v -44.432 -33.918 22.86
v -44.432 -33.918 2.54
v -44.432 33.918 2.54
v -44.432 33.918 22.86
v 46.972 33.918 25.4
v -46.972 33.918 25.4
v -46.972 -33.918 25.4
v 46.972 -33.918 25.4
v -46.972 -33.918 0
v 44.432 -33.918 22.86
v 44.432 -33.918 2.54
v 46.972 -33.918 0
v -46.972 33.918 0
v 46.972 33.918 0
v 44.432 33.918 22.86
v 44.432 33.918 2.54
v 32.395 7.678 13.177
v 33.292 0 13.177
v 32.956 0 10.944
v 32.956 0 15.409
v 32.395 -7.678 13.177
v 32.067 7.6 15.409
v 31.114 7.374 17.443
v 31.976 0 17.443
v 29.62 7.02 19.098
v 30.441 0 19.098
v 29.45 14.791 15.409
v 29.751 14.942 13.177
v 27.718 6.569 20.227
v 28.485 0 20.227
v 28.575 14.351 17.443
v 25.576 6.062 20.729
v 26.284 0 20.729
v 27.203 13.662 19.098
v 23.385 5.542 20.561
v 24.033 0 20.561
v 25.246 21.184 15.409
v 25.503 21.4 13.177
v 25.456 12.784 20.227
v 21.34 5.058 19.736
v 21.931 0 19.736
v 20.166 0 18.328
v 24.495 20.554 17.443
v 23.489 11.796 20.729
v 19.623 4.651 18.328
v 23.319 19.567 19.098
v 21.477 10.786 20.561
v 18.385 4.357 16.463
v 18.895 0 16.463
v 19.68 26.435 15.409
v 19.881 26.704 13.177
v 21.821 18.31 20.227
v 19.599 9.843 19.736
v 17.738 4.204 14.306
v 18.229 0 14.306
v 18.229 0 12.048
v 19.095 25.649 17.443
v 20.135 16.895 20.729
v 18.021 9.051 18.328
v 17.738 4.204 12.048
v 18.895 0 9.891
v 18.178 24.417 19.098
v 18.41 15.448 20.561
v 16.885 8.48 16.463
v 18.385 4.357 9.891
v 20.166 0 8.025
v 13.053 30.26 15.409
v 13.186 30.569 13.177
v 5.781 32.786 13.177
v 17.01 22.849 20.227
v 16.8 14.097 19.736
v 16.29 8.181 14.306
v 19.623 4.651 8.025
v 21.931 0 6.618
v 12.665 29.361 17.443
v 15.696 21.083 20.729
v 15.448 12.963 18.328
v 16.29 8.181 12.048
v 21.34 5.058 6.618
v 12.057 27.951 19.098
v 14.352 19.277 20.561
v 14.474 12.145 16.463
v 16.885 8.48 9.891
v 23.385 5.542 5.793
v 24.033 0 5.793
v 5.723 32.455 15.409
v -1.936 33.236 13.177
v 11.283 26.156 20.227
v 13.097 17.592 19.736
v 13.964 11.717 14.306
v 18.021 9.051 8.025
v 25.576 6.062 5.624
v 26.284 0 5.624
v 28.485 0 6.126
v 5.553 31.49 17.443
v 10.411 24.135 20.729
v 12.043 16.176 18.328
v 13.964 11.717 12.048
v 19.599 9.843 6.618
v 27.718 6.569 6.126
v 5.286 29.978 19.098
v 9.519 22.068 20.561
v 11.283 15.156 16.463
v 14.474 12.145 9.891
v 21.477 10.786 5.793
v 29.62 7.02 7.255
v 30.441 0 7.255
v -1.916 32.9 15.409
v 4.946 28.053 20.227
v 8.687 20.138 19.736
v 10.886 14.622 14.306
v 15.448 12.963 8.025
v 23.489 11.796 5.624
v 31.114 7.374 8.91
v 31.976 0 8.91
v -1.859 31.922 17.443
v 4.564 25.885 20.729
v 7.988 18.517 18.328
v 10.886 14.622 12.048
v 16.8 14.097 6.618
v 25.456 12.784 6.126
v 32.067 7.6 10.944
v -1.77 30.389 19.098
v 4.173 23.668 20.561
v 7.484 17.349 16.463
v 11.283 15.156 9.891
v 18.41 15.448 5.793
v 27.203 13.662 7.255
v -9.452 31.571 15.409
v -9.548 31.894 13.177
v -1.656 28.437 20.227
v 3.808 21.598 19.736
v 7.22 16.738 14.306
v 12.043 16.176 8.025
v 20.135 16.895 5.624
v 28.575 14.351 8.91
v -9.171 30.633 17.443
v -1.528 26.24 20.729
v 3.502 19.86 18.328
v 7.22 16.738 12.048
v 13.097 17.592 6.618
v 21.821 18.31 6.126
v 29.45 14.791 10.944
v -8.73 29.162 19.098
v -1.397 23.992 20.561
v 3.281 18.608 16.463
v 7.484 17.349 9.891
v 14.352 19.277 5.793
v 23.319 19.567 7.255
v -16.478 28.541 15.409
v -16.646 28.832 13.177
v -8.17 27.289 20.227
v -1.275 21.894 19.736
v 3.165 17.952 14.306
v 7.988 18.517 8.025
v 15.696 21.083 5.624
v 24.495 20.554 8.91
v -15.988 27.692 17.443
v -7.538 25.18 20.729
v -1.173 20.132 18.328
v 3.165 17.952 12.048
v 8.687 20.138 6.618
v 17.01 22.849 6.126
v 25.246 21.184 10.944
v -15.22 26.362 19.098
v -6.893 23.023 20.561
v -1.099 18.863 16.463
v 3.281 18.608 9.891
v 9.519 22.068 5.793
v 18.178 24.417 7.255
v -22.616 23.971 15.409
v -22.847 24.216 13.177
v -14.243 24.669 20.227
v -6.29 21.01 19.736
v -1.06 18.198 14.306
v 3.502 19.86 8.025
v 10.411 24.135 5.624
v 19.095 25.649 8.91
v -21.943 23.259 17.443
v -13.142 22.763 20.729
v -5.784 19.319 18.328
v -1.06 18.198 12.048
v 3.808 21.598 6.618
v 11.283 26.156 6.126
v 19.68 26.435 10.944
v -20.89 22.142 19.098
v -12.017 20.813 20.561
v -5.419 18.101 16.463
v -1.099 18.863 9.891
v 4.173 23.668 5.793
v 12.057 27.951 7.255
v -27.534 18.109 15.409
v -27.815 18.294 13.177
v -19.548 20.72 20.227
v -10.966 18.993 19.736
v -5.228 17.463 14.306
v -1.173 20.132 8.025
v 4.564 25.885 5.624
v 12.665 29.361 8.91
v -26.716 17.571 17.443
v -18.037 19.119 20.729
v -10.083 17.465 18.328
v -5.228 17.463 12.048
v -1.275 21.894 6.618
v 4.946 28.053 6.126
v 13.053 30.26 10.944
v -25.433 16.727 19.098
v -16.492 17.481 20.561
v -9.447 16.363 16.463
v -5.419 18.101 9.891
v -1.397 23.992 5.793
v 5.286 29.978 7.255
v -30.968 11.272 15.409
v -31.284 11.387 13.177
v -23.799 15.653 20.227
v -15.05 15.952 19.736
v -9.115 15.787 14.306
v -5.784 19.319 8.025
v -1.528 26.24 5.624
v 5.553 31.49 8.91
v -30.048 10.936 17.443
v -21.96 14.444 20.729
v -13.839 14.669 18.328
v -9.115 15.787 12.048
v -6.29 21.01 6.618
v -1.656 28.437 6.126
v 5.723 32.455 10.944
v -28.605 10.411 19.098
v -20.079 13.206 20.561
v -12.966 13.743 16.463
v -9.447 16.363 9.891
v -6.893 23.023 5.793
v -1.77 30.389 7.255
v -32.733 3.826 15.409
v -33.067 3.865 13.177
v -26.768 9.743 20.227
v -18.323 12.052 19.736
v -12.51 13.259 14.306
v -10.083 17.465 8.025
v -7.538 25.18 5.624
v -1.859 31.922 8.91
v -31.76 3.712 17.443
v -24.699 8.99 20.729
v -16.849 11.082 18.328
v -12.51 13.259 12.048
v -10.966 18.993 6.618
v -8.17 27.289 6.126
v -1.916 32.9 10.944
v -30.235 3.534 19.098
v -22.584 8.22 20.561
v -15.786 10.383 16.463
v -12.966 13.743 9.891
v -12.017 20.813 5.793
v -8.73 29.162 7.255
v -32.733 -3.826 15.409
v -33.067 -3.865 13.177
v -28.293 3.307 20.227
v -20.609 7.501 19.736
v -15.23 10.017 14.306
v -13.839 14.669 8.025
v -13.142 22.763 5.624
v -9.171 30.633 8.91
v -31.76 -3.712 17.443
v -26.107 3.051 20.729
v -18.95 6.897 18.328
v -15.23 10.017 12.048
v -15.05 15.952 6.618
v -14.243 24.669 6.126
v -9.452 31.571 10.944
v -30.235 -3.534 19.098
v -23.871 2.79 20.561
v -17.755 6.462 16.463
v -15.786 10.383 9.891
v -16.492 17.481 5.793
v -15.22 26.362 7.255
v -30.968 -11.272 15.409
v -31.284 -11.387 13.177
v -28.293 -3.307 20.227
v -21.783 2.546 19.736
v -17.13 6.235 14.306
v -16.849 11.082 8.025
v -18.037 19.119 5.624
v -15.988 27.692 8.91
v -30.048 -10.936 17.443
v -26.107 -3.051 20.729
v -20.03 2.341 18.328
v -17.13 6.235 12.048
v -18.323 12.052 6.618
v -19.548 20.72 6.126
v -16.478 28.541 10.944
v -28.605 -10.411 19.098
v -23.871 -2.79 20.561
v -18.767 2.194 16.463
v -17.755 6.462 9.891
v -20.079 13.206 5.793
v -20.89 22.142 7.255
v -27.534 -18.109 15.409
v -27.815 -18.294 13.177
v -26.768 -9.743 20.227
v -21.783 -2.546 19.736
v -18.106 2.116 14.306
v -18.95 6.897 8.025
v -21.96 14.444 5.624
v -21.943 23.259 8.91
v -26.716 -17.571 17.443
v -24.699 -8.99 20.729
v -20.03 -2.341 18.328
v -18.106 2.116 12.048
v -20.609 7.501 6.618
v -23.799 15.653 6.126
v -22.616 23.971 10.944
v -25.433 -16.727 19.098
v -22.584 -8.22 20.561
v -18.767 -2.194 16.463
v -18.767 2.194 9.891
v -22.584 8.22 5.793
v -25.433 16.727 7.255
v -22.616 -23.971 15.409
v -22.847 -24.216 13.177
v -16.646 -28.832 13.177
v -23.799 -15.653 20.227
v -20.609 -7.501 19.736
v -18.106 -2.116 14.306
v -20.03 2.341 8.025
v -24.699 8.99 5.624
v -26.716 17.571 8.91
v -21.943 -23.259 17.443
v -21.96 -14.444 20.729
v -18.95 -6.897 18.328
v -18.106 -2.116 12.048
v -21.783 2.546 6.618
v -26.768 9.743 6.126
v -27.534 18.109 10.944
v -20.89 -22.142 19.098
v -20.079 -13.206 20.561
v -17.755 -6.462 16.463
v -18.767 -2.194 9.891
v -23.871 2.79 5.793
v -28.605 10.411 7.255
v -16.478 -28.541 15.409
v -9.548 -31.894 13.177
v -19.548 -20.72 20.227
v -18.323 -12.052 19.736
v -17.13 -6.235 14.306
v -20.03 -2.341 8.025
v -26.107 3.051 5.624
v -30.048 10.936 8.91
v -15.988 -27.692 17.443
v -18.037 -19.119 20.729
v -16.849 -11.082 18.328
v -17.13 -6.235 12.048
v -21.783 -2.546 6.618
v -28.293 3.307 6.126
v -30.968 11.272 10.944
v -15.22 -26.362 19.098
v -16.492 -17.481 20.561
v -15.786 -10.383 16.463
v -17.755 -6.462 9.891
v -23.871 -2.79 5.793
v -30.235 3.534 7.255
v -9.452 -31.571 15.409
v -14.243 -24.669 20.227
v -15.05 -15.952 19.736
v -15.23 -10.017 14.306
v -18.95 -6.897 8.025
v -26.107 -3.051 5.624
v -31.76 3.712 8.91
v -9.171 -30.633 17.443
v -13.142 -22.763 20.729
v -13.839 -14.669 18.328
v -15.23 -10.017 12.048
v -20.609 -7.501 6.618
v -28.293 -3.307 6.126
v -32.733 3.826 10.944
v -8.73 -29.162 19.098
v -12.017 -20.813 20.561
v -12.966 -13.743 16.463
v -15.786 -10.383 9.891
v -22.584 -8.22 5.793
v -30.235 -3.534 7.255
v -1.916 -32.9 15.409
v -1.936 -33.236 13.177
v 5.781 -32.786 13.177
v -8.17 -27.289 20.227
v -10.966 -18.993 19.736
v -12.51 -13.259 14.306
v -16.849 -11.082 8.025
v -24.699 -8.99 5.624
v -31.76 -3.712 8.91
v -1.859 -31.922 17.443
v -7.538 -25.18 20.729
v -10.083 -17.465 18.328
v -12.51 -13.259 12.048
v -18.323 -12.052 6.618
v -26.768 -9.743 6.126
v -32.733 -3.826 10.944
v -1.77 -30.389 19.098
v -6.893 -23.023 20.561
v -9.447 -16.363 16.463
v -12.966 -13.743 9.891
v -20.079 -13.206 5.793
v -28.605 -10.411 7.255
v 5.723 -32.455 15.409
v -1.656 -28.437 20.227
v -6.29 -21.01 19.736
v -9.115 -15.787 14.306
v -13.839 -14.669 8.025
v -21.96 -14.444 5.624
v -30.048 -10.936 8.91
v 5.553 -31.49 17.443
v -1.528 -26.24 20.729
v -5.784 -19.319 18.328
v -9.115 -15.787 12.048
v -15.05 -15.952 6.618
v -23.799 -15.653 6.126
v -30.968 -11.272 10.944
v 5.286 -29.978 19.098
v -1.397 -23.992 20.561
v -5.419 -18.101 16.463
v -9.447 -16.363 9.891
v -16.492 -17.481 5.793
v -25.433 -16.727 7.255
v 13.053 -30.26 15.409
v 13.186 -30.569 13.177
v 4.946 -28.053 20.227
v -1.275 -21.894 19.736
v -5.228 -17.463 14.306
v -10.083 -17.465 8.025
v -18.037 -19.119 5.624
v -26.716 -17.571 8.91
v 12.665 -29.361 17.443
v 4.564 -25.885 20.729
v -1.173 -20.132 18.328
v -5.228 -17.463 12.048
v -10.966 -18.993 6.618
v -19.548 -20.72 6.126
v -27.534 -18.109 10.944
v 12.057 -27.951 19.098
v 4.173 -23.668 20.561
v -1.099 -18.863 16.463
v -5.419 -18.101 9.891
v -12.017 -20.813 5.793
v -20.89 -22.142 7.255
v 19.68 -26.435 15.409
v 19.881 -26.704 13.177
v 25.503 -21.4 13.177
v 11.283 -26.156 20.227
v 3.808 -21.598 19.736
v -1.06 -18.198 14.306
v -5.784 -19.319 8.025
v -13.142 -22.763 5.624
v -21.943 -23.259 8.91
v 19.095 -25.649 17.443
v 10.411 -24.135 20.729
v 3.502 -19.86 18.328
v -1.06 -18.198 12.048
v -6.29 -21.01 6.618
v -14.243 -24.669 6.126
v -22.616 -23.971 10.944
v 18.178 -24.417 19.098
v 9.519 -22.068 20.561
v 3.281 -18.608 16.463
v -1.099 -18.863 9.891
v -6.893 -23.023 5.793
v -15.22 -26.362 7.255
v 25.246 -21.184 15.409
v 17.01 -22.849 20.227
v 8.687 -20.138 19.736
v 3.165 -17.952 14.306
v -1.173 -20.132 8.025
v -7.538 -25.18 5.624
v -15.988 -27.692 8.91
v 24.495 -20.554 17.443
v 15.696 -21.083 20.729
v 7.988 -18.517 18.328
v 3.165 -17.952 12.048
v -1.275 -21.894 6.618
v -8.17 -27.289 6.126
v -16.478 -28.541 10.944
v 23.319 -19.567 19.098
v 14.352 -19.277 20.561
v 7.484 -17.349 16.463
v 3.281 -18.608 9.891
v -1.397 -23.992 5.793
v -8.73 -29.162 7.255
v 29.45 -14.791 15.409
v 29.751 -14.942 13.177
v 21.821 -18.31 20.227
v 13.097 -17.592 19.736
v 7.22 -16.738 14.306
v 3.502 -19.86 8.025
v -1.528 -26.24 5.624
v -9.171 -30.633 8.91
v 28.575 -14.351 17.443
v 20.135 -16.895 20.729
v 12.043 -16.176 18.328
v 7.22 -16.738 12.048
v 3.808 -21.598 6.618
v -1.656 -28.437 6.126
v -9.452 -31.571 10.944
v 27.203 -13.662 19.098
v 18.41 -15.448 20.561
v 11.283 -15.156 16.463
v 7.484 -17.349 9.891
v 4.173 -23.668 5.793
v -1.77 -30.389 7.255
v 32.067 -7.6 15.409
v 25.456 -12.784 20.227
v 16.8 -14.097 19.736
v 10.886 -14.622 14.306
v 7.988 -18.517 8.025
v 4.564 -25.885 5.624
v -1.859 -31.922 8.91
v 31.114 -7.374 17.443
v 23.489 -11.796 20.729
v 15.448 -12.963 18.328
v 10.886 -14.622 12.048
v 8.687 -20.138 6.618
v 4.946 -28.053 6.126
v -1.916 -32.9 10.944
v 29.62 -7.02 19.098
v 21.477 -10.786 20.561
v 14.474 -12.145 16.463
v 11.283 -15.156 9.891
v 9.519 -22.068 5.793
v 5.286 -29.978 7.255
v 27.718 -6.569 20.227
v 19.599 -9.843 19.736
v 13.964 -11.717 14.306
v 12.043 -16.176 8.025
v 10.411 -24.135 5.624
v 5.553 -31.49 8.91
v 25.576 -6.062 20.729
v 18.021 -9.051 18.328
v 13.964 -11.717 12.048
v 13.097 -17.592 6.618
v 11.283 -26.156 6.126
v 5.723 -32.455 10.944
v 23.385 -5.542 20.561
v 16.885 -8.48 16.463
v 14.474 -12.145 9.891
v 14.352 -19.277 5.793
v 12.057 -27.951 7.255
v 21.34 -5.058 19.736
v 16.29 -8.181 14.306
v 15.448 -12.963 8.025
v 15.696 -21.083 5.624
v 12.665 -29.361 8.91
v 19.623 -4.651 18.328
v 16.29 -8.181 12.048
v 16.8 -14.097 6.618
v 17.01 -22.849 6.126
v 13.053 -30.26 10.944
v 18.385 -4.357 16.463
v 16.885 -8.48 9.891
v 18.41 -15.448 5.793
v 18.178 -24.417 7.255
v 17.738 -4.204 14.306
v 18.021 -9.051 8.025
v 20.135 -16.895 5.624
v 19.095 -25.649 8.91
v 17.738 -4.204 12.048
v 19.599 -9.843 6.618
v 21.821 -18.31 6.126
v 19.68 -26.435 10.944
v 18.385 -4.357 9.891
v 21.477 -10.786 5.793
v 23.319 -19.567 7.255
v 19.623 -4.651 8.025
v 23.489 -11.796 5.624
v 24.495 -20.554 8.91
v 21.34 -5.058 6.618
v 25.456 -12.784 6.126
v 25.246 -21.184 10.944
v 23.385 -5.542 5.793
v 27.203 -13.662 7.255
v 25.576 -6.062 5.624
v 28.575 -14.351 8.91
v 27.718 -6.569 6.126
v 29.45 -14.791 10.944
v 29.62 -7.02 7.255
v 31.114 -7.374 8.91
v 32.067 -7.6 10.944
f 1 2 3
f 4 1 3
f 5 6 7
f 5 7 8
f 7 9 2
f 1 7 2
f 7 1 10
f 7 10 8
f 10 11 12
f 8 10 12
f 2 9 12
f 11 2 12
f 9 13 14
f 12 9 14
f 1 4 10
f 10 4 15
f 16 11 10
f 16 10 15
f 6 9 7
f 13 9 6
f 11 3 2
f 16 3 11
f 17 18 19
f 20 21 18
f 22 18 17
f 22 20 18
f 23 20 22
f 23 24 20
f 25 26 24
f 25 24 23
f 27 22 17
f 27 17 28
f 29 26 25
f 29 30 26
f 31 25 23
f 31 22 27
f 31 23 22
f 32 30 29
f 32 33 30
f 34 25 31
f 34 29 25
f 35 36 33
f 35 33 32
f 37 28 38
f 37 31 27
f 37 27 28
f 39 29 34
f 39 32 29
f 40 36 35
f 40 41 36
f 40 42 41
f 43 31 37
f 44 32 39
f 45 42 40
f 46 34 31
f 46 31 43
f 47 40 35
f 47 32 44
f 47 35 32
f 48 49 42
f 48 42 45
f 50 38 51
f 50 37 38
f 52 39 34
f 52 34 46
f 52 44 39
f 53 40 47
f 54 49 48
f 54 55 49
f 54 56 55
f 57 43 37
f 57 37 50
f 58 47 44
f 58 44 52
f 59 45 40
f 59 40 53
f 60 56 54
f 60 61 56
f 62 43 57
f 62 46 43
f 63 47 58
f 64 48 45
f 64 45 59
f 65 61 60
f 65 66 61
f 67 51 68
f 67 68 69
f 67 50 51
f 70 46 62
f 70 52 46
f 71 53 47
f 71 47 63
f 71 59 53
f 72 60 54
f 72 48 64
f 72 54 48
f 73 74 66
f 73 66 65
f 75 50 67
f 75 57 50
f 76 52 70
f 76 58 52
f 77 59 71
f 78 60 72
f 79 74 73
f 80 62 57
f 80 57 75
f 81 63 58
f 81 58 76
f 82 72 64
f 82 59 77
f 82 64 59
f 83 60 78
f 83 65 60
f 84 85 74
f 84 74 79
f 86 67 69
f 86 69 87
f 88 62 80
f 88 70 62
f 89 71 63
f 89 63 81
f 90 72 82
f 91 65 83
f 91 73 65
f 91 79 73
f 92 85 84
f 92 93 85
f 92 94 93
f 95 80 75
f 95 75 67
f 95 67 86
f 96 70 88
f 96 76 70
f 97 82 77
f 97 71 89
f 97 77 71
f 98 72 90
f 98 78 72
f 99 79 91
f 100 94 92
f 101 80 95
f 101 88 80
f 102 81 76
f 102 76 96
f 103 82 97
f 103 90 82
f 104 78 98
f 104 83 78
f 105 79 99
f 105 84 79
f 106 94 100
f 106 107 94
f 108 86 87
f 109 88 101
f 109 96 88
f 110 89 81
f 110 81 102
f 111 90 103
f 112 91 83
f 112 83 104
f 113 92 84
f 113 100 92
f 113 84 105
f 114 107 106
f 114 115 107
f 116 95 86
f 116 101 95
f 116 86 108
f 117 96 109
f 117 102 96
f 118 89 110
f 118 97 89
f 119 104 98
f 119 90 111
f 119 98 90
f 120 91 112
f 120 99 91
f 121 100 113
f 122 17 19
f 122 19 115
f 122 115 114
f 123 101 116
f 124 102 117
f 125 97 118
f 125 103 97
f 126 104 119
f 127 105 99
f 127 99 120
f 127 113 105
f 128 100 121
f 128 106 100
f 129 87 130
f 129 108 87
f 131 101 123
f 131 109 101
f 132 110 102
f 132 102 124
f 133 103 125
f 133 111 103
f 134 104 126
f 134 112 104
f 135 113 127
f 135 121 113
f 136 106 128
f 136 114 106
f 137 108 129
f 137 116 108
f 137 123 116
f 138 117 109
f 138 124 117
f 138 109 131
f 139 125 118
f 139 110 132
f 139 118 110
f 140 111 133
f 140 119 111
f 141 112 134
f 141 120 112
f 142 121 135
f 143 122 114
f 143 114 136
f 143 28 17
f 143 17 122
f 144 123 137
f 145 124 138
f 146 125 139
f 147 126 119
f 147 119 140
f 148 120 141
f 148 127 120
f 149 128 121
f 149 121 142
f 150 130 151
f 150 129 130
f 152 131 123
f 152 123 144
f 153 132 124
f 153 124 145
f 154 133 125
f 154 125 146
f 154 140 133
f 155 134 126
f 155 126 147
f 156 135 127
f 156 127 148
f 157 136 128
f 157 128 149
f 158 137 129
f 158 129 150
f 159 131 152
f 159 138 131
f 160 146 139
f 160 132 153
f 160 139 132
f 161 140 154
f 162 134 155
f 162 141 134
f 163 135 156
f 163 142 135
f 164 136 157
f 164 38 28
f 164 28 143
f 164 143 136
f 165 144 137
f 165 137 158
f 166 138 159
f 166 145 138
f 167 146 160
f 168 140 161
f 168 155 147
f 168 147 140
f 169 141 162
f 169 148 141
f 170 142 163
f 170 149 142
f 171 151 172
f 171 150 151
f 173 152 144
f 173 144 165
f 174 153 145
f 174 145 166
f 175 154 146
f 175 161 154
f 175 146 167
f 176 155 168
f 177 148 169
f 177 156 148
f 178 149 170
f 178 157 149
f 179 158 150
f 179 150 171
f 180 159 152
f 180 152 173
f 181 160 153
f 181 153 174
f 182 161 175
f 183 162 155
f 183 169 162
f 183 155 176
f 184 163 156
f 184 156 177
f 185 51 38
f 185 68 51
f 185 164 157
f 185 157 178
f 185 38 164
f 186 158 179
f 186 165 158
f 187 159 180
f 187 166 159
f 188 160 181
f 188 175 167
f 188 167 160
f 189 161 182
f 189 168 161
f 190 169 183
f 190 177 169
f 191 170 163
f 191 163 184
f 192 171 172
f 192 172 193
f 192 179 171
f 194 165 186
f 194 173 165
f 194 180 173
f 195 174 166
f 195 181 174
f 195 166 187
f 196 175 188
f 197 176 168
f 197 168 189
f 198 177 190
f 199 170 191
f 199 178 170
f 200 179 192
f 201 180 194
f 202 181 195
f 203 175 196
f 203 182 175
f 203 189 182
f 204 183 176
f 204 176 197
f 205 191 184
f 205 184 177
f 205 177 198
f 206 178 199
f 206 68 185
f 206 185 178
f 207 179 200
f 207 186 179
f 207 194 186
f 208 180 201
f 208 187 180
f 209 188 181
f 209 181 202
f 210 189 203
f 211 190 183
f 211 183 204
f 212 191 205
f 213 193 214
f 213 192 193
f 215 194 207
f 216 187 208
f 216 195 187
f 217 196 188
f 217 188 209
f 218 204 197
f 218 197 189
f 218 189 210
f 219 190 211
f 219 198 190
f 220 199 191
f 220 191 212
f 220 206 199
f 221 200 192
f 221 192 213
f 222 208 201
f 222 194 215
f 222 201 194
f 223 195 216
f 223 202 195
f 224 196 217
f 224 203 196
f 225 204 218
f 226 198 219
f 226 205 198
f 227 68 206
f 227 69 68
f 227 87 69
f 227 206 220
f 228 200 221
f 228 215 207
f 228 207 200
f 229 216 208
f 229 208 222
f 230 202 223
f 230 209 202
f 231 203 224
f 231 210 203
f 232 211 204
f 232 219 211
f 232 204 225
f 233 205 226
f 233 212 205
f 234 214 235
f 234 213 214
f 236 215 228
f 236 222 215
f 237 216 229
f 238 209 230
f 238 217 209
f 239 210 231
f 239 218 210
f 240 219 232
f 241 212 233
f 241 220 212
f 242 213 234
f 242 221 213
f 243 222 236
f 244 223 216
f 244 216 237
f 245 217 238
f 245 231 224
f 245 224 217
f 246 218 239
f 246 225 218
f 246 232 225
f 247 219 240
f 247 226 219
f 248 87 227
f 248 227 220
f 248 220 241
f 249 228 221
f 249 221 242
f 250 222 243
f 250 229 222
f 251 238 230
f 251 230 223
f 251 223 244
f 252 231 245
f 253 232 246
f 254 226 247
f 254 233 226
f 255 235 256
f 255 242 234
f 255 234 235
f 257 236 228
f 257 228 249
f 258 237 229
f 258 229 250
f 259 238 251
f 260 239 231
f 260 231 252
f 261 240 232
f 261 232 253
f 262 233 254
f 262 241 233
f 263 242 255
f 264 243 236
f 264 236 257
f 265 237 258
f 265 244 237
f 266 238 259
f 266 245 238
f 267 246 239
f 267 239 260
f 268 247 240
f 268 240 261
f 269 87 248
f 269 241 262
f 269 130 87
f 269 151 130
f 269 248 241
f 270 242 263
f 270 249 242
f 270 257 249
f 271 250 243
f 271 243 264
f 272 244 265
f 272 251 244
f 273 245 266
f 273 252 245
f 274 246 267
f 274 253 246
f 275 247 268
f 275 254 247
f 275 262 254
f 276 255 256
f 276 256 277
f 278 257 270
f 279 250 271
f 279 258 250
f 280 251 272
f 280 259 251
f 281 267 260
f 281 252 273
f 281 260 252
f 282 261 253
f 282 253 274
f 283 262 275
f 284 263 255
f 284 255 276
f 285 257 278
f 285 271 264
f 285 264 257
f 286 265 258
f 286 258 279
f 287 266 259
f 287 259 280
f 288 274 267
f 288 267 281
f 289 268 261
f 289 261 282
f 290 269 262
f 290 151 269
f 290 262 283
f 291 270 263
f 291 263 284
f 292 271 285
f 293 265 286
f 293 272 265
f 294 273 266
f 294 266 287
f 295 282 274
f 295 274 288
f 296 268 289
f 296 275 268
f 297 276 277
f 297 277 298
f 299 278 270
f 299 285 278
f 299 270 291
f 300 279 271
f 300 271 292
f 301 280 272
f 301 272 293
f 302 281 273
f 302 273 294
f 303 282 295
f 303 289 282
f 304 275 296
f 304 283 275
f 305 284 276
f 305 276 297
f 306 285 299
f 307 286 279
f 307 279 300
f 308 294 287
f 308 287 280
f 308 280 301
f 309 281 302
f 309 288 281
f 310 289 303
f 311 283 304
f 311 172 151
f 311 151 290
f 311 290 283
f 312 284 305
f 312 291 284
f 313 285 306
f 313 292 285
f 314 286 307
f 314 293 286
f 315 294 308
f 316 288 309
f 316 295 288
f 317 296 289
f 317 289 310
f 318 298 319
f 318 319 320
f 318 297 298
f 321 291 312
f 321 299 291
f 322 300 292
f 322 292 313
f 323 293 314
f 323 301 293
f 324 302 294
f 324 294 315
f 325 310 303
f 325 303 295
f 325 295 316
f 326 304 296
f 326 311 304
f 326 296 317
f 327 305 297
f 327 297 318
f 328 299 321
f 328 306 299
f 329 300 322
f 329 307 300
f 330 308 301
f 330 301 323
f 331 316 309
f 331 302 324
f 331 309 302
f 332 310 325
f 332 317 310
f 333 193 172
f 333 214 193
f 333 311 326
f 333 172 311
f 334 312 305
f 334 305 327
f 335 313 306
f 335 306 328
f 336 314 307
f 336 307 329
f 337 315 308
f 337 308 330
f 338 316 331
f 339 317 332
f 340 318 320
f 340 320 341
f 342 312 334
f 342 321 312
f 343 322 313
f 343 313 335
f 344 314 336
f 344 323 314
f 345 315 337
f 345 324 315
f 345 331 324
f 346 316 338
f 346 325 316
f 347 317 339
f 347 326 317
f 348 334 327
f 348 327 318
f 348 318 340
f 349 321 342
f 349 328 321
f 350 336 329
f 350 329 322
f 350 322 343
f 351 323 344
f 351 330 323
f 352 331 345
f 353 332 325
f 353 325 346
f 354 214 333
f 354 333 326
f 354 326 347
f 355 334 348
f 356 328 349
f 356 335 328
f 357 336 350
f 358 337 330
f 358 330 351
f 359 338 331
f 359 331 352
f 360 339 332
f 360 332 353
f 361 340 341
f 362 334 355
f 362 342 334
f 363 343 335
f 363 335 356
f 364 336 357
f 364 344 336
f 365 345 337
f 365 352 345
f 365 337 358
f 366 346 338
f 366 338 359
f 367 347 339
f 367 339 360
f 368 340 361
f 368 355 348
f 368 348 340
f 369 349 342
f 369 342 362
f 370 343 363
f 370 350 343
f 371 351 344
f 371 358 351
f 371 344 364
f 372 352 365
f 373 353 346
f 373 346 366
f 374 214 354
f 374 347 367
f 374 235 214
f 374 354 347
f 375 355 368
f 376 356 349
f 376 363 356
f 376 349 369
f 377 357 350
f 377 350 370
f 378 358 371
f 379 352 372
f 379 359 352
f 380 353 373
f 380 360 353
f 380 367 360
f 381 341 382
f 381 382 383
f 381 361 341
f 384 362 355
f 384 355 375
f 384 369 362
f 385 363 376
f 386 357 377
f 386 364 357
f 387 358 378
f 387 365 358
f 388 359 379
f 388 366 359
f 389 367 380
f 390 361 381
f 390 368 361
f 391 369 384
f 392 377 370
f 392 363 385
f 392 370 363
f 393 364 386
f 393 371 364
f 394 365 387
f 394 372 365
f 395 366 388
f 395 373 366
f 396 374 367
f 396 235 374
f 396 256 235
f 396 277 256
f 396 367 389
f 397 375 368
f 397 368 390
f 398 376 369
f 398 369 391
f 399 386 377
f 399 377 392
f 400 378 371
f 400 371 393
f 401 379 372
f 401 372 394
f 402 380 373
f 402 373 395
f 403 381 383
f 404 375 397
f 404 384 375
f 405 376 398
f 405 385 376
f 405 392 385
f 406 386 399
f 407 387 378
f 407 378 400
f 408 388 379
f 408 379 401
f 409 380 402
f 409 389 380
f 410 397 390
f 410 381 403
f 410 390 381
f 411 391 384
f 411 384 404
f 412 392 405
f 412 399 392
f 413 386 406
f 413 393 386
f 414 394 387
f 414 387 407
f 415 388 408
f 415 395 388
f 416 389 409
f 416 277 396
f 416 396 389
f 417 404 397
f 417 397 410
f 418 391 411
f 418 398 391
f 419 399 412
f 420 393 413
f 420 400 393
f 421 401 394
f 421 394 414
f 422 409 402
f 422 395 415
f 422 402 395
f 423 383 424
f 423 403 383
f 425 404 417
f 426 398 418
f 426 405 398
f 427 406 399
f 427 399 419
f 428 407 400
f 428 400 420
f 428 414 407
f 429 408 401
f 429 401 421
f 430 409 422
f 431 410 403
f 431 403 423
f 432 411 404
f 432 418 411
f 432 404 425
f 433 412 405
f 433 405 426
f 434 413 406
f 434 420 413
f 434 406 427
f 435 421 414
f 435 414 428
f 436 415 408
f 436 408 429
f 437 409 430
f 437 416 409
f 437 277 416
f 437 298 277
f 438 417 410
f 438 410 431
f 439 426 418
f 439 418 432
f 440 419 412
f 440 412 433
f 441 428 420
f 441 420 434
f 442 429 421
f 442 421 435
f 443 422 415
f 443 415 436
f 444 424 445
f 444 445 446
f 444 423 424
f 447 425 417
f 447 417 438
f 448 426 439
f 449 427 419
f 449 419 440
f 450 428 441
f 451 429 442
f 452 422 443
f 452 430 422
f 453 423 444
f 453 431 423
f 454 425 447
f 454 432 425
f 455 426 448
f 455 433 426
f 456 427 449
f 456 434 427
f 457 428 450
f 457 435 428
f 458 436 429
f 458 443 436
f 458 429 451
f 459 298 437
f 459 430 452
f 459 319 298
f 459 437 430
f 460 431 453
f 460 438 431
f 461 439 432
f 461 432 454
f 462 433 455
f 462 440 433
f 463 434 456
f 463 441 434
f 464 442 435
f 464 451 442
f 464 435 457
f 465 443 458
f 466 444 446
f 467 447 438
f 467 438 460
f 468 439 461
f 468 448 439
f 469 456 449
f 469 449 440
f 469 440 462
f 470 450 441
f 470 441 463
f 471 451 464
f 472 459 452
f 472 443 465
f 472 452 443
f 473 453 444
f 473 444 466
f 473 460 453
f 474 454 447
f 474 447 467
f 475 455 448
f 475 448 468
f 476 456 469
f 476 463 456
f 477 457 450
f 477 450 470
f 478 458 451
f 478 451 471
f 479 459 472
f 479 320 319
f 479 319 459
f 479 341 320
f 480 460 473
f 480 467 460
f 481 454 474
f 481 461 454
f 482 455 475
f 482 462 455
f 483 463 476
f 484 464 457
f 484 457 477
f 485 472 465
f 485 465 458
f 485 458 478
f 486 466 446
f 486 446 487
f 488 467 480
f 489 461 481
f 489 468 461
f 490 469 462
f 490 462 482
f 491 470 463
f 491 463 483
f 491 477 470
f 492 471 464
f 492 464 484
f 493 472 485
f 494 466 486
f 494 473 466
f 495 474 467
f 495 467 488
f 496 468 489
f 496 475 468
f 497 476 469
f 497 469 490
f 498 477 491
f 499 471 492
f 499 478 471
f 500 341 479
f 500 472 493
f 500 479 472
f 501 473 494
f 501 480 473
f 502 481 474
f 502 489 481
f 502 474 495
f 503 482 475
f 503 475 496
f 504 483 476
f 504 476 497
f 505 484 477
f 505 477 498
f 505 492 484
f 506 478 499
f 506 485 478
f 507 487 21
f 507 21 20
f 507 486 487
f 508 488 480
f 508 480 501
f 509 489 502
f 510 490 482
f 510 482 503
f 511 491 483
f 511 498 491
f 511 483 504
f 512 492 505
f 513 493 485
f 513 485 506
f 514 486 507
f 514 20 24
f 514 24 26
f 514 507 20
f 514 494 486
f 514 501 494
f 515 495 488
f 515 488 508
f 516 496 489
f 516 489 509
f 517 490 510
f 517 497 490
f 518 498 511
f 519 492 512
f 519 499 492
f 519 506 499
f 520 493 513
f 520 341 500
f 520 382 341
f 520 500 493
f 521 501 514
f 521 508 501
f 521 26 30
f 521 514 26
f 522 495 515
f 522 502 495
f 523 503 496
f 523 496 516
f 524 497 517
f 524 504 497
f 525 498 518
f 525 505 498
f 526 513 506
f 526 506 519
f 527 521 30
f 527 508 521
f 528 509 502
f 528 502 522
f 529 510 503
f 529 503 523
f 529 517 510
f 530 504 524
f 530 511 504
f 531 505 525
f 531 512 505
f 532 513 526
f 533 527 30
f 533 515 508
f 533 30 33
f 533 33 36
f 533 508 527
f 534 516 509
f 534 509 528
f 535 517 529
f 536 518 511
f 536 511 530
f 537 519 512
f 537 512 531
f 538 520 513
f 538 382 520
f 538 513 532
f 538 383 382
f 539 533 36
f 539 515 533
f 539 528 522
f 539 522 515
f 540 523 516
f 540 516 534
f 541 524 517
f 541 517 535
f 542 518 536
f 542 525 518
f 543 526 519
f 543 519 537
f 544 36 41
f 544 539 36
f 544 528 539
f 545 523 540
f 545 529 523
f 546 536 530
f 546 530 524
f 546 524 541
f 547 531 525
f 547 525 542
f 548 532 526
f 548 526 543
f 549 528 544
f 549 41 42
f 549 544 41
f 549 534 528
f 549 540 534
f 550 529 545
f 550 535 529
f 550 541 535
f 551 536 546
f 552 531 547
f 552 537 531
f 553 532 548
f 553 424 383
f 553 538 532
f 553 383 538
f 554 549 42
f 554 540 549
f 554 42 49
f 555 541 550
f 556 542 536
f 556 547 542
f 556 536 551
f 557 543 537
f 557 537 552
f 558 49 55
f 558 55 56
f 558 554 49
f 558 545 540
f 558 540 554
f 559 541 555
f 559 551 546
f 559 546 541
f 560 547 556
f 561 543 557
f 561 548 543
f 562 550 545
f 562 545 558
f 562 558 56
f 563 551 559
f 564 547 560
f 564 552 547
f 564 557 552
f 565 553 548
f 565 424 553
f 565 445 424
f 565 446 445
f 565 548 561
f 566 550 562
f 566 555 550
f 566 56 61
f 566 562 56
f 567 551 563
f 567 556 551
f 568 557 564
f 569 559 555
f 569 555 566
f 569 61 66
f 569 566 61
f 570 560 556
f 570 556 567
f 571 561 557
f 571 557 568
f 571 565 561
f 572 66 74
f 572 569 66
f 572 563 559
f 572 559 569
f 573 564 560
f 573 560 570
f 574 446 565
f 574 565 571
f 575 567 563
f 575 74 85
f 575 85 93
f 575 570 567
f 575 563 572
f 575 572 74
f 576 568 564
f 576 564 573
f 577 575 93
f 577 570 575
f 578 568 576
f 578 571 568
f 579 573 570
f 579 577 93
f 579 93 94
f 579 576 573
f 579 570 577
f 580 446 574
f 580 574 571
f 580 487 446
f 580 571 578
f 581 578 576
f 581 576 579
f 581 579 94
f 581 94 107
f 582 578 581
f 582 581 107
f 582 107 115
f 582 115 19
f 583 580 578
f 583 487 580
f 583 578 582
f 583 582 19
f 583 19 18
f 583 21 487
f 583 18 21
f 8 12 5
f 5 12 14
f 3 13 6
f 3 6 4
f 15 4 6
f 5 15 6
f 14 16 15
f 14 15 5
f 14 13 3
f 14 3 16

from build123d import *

# Parameters (mm, degrees)
F0_W     = 93.944326
F0_H     = 67.836226
F1_DEPTH = 25.4
F2_T     = -2.54
F3_R     = 7.57382


with BuildPart() as f1:
    # F0 (on Top) → F1 (new body)
    with BuildSketch(Plane.XY):
        Rectangle(F0_W, F0_H)
    extrude(amount=F1_DEPTH)

    # F2
    f2_openings = [f1.faces().sort_by_distance(p)[0] for p in [
        (0, -33.918113, 12.7),
        (0, 33.918113, 12.7),
    ]]
    offset(amount=F2_T, openings=f2_openings)


with BuildPart() as f4:
    # F3 (on Front) → F4 (revolve)
    with BuildSketch(Plane.XZ):
        with Locations((25.718397, 13.176708)):
            Circle(F3_R)
    revolve(axis=Axis((0, 0, 12.303553), (0, 0, 1)))


solid = Compound([f1.part, f4.part])
